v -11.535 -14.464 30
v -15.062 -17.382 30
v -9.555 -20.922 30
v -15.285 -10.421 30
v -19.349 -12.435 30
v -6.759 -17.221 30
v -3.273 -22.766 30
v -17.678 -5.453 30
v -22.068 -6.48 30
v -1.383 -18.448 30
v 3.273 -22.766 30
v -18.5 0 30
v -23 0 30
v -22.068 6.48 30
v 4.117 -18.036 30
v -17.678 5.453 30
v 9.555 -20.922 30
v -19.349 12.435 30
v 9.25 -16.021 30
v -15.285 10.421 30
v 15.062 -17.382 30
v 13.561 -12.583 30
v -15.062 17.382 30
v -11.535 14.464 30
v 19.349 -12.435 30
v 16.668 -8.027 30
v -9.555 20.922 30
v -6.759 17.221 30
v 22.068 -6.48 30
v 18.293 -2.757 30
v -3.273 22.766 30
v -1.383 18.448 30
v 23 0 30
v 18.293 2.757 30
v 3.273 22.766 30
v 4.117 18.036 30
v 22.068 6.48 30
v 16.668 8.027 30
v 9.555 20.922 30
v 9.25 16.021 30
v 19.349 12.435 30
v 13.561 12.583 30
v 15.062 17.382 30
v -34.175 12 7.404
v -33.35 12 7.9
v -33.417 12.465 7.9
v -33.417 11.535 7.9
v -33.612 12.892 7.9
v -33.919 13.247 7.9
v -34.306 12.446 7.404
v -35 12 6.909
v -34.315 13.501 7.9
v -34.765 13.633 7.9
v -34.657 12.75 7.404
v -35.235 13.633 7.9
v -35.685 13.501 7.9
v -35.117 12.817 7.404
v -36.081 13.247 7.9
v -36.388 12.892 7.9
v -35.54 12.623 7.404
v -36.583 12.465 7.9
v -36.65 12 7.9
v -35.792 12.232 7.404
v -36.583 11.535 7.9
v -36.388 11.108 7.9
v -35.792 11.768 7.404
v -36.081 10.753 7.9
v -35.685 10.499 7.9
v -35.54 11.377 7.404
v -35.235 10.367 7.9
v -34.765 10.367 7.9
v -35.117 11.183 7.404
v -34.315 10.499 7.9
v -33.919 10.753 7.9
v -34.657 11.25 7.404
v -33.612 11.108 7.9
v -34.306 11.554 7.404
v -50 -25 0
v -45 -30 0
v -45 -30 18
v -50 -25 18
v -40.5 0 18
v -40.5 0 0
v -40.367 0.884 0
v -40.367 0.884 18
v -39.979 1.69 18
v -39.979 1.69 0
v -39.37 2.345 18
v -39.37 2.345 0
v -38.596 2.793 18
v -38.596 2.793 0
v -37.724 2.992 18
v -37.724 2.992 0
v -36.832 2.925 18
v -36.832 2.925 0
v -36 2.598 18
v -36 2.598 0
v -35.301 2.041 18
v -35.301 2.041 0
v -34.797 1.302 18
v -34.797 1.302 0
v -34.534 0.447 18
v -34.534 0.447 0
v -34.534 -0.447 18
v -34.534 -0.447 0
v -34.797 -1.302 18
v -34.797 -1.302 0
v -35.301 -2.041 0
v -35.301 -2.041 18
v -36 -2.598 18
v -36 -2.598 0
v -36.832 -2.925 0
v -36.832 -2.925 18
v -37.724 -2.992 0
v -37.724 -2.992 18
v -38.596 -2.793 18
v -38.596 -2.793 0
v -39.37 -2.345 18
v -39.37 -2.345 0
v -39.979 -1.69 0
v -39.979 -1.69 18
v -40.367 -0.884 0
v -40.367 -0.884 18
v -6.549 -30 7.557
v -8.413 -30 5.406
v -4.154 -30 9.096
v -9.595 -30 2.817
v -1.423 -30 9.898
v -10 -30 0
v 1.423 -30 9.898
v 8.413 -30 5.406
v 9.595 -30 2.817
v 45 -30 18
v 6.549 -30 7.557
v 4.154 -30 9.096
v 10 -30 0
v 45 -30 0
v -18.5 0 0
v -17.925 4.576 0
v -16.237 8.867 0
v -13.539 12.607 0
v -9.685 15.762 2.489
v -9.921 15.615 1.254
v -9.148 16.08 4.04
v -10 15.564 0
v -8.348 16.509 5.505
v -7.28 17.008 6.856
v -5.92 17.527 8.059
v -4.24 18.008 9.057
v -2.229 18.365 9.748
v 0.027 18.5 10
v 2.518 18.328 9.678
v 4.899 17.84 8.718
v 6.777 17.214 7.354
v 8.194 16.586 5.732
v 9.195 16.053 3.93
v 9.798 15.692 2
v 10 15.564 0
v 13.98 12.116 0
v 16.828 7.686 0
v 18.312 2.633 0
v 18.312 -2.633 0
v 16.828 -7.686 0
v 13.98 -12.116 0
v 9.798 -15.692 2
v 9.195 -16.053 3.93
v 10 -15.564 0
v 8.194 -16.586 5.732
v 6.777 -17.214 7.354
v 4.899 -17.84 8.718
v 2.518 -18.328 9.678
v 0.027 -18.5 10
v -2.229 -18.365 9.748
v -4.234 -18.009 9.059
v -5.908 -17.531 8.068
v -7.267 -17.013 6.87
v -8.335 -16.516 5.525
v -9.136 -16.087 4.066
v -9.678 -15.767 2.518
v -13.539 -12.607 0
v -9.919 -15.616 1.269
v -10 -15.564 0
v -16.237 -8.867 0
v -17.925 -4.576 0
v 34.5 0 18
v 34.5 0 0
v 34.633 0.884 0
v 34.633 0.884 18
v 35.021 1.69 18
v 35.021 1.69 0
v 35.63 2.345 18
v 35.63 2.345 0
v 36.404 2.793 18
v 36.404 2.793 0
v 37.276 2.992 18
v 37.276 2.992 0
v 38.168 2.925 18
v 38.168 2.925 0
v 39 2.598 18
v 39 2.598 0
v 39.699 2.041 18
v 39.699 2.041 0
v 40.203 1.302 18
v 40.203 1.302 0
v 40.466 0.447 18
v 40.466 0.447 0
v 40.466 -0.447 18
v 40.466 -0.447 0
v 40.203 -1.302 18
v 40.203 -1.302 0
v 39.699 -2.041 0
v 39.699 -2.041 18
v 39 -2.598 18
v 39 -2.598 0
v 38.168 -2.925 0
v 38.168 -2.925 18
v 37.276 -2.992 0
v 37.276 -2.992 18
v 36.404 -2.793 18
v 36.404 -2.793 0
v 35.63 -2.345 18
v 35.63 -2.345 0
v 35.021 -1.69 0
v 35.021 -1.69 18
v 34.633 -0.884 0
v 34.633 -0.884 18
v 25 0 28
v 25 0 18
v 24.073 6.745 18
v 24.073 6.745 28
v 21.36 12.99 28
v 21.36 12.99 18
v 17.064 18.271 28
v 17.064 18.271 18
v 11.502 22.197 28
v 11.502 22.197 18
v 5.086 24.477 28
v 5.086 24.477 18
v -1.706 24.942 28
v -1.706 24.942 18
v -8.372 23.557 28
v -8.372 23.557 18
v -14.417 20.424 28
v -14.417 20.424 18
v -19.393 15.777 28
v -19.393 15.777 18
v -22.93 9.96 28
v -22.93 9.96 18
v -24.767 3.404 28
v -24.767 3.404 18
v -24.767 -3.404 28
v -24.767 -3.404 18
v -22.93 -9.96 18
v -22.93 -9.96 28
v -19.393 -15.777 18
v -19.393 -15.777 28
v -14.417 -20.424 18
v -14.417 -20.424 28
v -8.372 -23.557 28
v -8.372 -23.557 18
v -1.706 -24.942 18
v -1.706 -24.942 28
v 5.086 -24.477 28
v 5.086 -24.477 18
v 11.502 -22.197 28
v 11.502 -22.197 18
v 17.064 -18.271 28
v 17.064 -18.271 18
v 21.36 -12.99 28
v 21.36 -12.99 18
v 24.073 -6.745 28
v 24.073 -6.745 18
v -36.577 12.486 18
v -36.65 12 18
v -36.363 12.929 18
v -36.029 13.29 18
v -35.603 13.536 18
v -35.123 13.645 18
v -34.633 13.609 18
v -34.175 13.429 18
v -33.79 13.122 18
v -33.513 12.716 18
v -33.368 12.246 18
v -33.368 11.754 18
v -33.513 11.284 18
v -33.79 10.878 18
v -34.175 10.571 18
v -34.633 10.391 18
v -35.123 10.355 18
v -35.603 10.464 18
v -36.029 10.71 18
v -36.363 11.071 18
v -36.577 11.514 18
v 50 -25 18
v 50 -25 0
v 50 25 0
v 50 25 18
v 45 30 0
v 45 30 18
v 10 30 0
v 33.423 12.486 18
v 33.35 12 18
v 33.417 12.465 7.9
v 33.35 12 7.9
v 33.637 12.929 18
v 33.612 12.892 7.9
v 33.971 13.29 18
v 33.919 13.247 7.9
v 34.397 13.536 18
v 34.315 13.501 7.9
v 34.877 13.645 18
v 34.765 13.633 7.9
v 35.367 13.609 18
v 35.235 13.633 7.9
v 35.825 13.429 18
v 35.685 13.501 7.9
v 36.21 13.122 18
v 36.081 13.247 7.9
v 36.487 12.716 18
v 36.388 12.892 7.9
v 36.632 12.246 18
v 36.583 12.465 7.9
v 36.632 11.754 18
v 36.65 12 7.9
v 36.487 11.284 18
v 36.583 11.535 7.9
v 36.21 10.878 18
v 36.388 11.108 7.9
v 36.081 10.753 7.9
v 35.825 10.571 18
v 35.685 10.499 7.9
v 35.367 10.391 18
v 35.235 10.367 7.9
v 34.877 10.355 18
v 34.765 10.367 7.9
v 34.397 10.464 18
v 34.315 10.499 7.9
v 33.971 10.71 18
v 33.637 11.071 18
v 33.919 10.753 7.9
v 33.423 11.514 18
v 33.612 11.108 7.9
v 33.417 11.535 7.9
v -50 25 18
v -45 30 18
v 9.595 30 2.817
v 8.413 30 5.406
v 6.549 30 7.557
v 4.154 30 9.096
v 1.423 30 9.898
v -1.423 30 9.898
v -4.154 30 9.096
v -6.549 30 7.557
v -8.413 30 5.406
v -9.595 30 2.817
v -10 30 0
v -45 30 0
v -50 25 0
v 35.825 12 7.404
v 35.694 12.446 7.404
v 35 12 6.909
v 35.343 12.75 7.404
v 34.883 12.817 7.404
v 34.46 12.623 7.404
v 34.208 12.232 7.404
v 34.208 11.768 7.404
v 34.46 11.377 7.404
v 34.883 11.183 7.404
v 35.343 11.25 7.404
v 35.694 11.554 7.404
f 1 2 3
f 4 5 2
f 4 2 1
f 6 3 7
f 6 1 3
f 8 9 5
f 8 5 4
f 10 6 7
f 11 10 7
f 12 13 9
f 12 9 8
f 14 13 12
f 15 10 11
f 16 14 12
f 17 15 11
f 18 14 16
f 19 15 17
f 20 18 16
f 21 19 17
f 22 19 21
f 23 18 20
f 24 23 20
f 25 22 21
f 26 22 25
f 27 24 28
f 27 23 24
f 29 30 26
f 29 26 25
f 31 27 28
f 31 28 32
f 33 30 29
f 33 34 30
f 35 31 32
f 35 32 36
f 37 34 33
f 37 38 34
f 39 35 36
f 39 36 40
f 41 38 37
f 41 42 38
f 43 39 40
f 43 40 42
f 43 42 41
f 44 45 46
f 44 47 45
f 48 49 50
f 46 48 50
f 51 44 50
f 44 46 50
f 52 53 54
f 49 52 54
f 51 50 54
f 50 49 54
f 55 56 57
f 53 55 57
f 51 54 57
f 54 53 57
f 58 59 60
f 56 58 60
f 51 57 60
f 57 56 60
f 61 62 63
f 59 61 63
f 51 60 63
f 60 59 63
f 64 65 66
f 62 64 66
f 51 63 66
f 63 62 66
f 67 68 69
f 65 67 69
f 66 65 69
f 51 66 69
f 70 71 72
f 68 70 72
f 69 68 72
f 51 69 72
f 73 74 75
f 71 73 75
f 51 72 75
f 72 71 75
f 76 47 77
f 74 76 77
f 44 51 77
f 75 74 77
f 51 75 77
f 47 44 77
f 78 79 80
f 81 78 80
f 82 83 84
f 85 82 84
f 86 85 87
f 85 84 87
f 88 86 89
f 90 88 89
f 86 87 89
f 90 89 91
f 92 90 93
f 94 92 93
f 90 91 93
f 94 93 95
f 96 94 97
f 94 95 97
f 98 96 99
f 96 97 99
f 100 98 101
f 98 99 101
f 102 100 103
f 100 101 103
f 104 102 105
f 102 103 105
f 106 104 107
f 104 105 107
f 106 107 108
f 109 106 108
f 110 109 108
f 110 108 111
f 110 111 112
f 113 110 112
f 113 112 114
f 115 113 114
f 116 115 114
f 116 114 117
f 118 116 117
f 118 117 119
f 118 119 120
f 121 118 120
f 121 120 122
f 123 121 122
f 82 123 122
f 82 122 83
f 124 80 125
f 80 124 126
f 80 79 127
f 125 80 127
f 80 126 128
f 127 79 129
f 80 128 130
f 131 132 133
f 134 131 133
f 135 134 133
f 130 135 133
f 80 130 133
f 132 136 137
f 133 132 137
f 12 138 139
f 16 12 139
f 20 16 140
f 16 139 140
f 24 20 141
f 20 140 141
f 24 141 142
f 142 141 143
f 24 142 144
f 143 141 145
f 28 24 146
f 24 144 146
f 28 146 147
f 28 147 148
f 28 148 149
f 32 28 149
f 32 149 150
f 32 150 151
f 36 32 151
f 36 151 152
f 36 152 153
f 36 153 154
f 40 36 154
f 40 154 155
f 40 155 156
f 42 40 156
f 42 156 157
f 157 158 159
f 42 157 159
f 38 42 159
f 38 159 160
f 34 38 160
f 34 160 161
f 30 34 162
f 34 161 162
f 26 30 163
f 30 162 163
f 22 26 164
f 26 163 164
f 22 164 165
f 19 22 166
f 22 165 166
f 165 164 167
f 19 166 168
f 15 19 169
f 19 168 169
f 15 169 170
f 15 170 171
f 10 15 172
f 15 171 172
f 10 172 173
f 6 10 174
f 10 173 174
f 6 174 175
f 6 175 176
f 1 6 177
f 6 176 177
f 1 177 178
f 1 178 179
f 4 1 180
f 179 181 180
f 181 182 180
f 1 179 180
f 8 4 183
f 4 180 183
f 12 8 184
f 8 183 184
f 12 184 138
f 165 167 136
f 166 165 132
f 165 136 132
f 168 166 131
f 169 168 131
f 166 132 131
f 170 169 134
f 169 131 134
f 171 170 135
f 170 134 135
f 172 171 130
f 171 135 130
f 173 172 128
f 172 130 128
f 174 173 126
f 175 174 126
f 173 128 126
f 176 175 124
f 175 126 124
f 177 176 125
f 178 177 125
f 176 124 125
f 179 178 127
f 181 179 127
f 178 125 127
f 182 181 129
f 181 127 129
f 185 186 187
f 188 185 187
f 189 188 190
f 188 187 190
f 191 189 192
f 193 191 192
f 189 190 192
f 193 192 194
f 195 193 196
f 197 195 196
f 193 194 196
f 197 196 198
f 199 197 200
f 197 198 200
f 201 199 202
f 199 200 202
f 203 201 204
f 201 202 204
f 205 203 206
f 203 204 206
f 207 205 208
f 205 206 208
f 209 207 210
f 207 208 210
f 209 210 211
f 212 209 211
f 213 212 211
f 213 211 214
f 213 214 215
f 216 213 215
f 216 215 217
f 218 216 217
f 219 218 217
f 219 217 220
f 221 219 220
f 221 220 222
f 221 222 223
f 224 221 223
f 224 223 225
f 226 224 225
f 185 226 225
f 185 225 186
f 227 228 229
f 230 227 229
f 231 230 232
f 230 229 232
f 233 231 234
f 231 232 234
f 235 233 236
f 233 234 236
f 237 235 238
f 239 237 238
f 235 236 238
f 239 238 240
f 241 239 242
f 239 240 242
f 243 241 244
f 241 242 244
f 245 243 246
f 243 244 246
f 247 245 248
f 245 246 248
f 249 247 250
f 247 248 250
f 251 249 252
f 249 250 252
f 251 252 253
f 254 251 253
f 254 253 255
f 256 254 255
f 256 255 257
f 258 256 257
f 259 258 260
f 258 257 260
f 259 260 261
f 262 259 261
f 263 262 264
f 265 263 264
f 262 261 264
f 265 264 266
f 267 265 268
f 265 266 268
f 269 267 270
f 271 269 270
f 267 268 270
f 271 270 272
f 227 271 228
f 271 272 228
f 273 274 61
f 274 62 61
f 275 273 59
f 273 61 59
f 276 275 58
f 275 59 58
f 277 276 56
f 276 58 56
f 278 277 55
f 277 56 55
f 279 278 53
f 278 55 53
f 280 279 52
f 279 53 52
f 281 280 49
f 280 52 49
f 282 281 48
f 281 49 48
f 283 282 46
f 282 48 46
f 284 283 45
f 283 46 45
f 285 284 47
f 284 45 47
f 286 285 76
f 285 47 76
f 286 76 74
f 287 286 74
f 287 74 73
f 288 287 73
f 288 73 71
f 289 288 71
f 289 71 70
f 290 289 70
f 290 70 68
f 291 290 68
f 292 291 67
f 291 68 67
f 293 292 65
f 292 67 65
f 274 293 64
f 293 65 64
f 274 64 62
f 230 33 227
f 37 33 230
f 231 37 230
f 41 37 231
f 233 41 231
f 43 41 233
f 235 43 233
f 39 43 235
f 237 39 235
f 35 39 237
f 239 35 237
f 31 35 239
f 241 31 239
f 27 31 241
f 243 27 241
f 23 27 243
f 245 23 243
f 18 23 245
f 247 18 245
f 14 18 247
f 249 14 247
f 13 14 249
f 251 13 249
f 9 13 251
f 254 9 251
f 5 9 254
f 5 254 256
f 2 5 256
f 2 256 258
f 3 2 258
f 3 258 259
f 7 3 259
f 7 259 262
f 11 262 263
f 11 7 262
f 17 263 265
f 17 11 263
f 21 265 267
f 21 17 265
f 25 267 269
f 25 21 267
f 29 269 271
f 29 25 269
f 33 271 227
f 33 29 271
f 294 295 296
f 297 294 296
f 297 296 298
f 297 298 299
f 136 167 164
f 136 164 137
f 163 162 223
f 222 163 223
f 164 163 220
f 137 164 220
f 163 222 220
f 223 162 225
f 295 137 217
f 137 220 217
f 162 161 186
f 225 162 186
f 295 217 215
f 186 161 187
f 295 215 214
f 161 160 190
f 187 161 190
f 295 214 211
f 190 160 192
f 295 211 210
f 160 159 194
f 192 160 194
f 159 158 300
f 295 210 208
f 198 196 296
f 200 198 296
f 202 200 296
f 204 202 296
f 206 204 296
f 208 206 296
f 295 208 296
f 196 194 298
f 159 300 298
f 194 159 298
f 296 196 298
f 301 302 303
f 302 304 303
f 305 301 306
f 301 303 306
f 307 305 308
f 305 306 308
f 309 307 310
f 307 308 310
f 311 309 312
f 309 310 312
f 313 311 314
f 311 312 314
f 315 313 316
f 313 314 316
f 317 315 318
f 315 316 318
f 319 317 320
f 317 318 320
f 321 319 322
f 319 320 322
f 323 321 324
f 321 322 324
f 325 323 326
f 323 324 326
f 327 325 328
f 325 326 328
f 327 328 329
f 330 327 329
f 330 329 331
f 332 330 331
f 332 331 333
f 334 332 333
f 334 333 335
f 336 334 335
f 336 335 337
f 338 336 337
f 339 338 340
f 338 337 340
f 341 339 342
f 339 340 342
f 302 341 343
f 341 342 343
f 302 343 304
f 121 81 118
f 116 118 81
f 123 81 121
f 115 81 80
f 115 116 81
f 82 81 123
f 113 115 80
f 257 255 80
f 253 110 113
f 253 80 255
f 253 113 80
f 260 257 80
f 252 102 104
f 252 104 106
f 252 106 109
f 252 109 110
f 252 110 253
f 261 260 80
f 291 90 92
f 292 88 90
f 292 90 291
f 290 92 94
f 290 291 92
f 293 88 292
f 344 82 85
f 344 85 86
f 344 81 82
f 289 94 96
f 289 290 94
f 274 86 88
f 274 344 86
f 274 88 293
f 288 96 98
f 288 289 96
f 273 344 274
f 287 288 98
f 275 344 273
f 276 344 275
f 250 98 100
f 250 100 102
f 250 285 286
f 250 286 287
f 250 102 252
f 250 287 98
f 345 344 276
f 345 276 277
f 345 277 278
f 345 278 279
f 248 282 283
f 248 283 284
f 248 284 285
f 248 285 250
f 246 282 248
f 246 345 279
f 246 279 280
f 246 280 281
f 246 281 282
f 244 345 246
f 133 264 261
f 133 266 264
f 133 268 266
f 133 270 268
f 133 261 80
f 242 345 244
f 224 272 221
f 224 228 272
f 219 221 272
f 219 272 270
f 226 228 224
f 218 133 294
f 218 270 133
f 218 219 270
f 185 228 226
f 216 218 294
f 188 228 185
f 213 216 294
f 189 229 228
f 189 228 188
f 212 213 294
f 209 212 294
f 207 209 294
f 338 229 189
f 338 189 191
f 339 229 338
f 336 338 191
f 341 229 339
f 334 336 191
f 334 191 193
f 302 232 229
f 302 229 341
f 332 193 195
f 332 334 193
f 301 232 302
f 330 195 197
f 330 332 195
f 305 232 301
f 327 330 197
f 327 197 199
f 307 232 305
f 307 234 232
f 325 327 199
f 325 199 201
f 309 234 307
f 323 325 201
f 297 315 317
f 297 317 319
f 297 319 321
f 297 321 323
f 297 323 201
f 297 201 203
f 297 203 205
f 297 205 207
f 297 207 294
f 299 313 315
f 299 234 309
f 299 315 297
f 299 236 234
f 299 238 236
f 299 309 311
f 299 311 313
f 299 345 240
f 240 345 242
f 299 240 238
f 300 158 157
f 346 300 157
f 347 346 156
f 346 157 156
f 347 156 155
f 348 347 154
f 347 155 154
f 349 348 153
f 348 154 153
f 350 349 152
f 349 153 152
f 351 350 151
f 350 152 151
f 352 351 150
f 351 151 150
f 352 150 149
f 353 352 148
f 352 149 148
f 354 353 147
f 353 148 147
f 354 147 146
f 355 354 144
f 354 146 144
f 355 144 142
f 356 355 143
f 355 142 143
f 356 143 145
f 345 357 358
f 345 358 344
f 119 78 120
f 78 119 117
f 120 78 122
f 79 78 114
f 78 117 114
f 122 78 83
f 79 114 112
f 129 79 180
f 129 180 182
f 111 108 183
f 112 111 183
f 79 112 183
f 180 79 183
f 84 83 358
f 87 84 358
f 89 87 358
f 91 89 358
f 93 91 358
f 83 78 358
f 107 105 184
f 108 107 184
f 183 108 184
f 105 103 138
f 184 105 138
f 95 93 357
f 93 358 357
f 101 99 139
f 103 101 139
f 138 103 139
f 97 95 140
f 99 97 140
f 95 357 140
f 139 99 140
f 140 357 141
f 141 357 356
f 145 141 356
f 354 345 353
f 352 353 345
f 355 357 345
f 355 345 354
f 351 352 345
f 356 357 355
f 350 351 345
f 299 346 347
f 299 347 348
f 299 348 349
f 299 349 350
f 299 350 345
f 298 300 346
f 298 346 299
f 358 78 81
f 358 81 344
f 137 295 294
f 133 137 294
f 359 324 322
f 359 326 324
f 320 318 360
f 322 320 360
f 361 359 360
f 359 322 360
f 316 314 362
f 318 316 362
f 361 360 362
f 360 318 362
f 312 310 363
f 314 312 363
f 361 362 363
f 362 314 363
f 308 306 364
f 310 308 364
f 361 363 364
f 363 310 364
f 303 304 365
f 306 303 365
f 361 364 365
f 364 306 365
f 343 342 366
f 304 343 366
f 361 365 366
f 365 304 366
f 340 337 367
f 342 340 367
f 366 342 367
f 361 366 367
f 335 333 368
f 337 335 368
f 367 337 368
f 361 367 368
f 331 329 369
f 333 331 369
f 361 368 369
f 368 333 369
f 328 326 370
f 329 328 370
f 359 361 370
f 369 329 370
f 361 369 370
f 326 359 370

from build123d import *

# Parameters (mm, degrees)
F0_W      = 100
F0_H      = 60
F1_DEPTH  = 18
F2_R      = 25
F3_DEPTH  = 12
F4_SIZE   = 5
F5_SIZE   = 2
F7_D      = 37
F9_DEPTH  = 60.001
F11_D     = 6
F13_D     = 3.3
F13_DEPTH = 10.1
F13_TIP   = 0.9914200214


with BuildPart() as f1:
    # F0 (on Top) → F1 (new body)
    with BuildSketch(Plane.XY):
        Rectangle(F0_W, F0_H)
    extrude(amount=F1_DEPTH)

    # F2 (on face) → F3 (join)
    with BuildSketch(Plane.XY.offset(18)):
        Circle(F2_R)
    extrude(amount=F3_DEPTH)

    # F4
    f4_edges = [f1.edges().sort_by_distance(p)[0] for p in [
        (50, -30, 9),
        (-50, -30, 9),
        (-50, 30, 9),
        (50, 30, 9),
    ]]
    chamfer(f4_edges, length=F4_SIZE)

    # F5
    f5_edges = [f1.edges().sort_by_distance(p)[0] for p in [
        (-25, 0, 30),
    ]]
    chamfer(f5_edges, length=F5_SIZE)

    # F7 (through all)
    with Locations(Plane.XY.offset(30)):
        with Locations((0, 0)):
            Hole(F7_D / 2)

    # F8 (on face) → F9 (cut, through all)
    with BuildSketch(Plane.XZ.offset(30)):
        with BuildLine():
            ThreePointArc((-10, 0), (0, -10), (10, 0))
            Line((10, 0), (-10, 0))
        make_face()
        with BuildLine():
            Line((-10, 0), (10, 0))
            ThreePointArc((10, 0), (0, 10), (-10, 0))
        make_face()
    extrude(amount=-F9_DEPTH, mode=Mode.SUBTRACT)

    # F11 (through all)
    with Locations(Plane.XY.offset(18)):
        with Locations((37.5, 0), (-37.5, 0)):
            Hole(F11_D / 2)

    # F13
    with Locations(Plane.XY.offset(18)):
        with Locations((35, 12), (-35, 12)):
            Hole(F13_D / 2, depth=F13_DEPTH)
            with Locations((0, 0, -(F13_DEPTH + F13_TIP / 2))):  # 118° drill point
                Cone(0, F13_D / 2, F13_TIP, mode=Mode.SUBTRACT)


solid = f1.part
